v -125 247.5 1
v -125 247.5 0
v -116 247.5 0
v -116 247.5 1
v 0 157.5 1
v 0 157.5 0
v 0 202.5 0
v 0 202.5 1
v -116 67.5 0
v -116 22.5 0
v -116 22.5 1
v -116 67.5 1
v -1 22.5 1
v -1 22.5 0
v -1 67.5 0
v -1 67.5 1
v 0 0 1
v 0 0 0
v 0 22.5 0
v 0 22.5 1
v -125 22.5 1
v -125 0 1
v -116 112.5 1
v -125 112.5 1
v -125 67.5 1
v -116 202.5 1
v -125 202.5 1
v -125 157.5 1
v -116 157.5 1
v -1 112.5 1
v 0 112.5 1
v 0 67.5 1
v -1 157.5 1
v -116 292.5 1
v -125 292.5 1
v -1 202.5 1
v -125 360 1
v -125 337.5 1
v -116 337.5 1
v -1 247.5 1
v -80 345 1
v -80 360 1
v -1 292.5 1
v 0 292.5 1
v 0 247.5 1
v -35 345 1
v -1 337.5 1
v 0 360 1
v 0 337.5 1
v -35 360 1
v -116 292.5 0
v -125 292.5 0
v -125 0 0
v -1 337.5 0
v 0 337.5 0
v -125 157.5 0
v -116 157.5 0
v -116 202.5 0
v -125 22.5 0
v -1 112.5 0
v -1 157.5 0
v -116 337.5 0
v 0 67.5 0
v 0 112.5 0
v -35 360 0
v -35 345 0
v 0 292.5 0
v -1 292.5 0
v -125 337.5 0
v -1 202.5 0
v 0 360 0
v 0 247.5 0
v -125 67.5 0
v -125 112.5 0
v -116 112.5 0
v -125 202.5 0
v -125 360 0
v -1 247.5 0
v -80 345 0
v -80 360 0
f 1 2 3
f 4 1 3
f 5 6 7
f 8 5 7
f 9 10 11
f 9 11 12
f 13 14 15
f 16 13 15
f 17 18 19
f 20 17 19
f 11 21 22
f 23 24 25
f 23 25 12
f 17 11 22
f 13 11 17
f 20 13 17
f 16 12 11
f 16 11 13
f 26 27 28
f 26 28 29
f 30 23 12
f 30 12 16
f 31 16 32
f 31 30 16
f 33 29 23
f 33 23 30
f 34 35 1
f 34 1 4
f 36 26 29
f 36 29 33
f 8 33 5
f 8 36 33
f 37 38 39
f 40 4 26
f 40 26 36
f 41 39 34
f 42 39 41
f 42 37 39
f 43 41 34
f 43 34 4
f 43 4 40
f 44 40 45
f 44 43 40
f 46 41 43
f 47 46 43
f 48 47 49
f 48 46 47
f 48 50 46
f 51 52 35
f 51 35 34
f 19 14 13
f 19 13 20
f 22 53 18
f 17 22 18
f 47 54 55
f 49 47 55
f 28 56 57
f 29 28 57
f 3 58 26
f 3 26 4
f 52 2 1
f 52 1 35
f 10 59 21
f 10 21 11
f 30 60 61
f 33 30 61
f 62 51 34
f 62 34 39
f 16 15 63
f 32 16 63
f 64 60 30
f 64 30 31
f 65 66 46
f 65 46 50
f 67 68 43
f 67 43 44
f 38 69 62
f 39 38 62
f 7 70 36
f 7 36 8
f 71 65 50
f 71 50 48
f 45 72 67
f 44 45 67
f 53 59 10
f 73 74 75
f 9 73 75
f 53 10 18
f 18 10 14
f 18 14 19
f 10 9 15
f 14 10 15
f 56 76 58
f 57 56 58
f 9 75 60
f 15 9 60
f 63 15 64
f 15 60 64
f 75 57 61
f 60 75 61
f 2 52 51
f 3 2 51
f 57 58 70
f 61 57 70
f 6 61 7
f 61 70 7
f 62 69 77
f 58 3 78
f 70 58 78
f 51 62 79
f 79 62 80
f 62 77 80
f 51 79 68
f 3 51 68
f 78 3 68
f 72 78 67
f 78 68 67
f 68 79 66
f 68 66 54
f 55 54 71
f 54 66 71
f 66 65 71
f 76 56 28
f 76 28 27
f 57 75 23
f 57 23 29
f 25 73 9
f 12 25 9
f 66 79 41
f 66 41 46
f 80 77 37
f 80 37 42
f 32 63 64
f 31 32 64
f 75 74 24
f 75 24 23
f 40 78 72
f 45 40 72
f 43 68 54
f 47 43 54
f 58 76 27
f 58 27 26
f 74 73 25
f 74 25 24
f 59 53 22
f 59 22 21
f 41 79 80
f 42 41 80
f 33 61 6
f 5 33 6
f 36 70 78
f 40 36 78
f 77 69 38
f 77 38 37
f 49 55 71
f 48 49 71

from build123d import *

# Parameters (mm, degrees)
BOX010_W         = 45
BOX010_H         = 15
BOX010_DEPTH     = 1
BOX013_W         = 9
BOX013_H         = 45
BOX013_DEPTH     = 1
ARRAY004_Y_COUNT = 4
ARRAY004_Y_PITCH = 90
BOX014_W         = 1
BOX014_H         = 45
BOX014_DEPTH     = 1
ARRAY003_Y_COUNT = 4
ARRAY003_Y_PITCH = 90
BOX016_W         = 125
BOX016_H         = 360
BOX016_DEPTH     = 1


with BuildPart() as box010:
    # Box010 → Box010 (new body)
    with BuildSketch(Plane(origin=(-80, 345, 0), x_dir=(1, 0, 0), z_dir=(0, 0, 1))):
        with Locations((22.5, 7.5)):
            Rectangle(BOX010_W, BOX010_H)
    extrude(amount=BOX010_DEPTH)


with BuildPart() as array004:
    # Box013 → Box013 (new body)
    with BuildSketch(Plane(origin=(-125, 0, 0), x_dir=(1, 0, 0), z_dir=(0, 0, 1))):
        with Locations((4.5, 22.5)):
            Rectangle(BOX013_W, BOX013_H)
    extrude(amount=BOX013_DEPTH)

    # Array004 Y: Array004 ×4


with BuildPart() as array004_1:
    add(array004.part)
    with Locations(*[(0, i * ARRAY004_Y_PITCH, 0) for i in range(1, ARRAY004_Y_COUNT)]):
        add(array004.part)


with BuildPart() as array004_2:
    # Array004 placement: moved
    add(array004_1.part.moved(Location((0, 22.5, 0))))


with BuildPart() as array003:
    # Box014 → Box014 (new body)
    with BuildSketch(Plane(origin=(-1, 0, 0), x_dir=(1, 0, 0), z_dir=(0, 0, 1))):
        with Locations((0.5, 22.5)):
            Rectangle(BOX014_W, BOX014_H)
    extrude(amount=BOX014_DEPTH)

    # Array003 Y: Array003 ×4


with BuildPart() as array003_1:
    add(array003.part)
    with Locations(*[(0, i * ARRAY003_Y_PITCH, 0) for i in range(1, ARRAY003_Y_COUNT)]):
        add(array003.part)


with BuildPart() as array003_2:
    # Array003 placement: moved
    add(array003_1.part.moved(Location((0, 22.5, 0))))


with BuildPart() as cut002008005:
    # Box016 → Box016 (new body)
    with BuildSketch(Plane(origin=(-125, 0, 0), x_dir=(1, 0, 0), z_dir=(0, 0, 1))):
        with Locations((62.5, 180)):
            Rectangle(BOX016_W, BOX016_H)
    extrude(amount=BOX016_DEPTH)

    # Cut002008003: cut Array003
    add(array003_2.part, mode=Mode.SUBTRACT)

    # Cut002008004: cut Array004
    add(array004_2.part, mode=Mode.SUBTRACT)

    # Cut002008005: cut Box010
    add(box010.part, mode=Mode.SUBTRACT)


solid = cut002008005.part
